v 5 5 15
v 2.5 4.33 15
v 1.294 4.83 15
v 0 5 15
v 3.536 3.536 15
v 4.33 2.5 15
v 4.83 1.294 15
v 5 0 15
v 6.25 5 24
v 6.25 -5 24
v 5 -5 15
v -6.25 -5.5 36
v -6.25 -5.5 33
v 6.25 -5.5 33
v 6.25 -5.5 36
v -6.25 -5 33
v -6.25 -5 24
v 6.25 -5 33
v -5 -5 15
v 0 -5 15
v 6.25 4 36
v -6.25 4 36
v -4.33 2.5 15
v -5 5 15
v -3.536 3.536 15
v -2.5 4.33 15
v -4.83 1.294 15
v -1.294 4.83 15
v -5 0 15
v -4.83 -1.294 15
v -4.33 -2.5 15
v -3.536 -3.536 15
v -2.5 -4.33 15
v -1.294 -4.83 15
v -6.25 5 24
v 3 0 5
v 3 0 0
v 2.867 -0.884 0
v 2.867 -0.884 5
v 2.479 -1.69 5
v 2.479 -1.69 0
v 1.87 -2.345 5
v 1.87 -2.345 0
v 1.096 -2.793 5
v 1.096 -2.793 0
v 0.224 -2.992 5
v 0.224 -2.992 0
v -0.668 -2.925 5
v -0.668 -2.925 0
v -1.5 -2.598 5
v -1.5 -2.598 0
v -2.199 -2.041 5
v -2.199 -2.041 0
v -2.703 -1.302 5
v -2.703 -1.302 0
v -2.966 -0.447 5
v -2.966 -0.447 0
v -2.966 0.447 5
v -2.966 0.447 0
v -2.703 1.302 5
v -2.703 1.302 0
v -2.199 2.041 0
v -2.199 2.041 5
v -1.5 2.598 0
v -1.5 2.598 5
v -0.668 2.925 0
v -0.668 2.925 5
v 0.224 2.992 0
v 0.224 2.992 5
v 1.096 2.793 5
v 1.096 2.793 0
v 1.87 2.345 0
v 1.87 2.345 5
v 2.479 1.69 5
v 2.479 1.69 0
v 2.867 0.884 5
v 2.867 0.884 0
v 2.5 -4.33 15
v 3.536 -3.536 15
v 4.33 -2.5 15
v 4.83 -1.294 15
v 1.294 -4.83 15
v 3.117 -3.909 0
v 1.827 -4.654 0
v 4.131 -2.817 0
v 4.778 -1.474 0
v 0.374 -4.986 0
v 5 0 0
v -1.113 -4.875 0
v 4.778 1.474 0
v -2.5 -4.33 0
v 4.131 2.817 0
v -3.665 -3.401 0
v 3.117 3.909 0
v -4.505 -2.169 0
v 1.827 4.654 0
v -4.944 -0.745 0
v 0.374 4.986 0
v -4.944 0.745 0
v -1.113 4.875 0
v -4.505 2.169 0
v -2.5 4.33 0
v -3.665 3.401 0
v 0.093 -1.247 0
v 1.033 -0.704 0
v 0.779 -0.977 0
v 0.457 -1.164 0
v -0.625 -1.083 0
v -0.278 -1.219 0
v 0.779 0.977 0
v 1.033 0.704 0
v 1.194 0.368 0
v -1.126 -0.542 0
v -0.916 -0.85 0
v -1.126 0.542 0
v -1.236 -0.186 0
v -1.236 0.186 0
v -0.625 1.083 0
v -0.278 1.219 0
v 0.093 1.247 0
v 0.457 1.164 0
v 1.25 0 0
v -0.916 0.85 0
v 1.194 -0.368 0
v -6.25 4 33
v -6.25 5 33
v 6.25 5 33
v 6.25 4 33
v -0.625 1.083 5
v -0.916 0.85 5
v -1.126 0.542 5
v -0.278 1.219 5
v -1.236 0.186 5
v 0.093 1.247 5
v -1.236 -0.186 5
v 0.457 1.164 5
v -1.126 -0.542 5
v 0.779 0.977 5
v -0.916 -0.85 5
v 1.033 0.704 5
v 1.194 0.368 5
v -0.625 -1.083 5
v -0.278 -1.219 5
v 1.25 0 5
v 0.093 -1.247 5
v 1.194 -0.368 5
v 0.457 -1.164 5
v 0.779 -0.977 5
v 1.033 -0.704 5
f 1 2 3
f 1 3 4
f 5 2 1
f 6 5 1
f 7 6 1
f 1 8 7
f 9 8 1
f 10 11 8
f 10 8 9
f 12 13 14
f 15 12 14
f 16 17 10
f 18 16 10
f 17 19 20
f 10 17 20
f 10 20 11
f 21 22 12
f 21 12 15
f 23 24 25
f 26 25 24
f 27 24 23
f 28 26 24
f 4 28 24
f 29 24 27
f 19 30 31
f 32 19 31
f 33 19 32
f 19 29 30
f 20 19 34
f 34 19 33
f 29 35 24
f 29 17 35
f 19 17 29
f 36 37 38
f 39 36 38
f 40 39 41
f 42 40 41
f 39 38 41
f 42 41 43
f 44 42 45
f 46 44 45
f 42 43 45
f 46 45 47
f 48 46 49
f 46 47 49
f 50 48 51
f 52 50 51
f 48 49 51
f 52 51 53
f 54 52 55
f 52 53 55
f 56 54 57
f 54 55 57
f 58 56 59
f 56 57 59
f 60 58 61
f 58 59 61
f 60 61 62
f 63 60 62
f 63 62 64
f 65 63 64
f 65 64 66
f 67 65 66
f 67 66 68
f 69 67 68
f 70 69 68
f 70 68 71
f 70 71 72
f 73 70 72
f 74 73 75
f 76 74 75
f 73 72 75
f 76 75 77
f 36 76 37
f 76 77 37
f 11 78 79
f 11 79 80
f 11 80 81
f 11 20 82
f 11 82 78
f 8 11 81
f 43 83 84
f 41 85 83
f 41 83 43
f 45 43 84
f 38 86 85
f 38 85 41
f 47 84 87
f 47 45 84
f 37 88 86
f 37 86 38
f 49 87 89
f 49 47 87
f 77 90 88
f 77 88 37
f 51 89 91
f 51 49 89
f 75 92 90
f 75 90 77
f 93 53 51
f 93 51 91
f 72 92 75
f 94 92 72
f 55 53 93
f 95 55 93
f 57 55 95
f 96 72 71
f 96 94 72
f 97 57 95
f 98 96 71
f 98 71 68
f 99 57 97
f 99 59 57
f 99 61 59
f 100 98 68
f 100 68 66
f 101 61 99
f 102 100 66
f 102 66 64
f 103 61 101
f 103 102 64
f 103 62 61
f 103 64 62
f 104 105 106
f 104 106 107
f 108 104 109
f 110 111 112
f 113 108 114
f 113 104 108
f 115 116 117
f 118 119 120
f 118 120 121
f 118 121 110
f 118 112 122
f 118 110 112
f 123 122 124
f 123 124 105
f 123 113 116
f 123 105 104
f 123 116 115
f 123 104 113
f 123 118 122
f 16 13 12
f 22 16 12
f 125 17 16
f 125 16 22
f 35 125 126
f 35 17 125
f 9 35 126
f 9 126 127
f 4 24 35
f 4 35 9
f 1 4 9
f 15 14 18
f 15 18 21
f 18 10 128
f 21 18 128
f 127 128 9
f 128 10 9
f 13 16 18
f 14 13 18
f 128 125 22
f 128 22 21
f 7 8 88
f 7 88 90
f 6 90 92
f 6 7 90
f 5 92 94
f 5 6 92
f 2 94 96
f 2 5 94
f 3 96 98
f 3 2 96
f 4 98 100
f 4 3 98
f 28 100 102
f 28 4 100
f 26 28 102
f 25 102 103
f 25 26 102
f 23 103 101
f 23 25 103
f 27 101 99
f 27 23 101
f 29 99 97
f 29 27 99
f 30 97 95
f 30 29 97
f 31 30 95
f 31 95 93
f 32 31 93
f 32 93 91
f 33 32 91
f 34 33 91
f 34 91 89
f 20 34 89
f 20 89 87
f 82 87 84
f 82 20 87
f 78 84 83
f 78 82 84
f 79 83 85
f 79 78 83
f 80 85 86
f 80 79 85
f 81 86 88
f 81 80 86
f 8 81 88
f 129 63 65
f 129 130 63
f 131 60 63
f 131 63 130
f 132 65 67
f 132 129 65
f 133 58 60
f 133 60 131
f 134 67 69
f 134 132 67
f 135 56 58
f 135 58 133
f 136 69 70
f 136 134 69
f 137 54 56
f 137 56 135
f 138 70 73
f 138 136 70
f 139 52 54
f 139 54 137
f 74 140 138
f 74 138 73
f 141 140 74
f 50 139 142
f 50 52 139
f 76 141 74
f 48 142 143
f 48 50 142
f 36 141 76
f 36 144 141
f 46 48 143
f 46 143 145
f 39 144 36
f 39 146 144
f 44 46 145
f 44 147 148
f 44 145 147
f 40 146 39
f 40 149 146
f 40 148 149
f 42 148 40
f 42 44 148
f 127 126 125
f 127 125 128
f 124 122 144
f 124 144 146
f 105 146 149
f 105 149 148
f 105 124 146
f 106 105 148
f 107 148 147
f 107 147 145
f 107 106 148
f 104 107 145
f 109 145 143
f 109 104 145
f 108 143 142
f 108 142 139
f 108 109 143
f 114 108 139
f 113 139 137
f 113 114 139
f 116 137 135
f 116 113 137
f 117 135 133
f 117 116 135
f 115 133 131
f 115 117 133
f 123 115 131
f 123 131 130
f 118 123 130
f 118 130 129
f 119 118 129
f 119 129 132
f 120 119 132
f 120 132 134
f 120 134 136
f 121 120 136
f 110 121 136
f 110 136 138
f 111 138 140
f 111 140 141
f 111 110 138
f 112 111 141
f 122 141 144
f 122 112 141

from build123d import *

# Parameters (mm, degrees)
F0_W     = 5
F0_H     = 15
F2_R     = 3
F2_R_2   = 1.25
F3_DEPTH = 5
F5_DEPTH = 5
F6_W     = 12.5
F6_H     = 10
F7_DEPTH = 9
F8_W     = 12.5
F8_H     = 9.5
F9_DEPTH = 3


with BuildPart() as f1:
    # F0 (on Front) → F1 (revolve)
    with BuildSketch(Plane.XZ):
        with Locations((2.5, 7.5)):
            Rectangle(F0_W, F0_H)
    revolve(axis=Axis((0, 0, 7.5), (0, 0, 1)))

    # F2 (on face) → F3 (cut)
    with BuildSketch(Plane(origin=(0, 0, 0), x_dir=(1, 0, 0), z_dir=(0, 0, -1))):
        Circle(F2_R)
        Circle(F2_R_2, mode=Mode.SUBTRACT)
    extrude(amount=-F3_DEPTH, mode=Mode.SUBTRACT)

    # F4 (on Front) → F5 (join, symmetric)
    with BuildSketch(Plane.XZ):
        Polygon((-6.25, 24), (-5, 15), (5, 15), (6.25, 24), align=None)
    extrude(amount=F5_DEPTH, both=True)

    # F6 (on face) → F7 (join)
    with BuildSketch(Plane.XY.offset(24)):
        Rectangle(F6_W, F6_H)
    extrude(amount=F7_DEPTH)

    # F8 (on face) → F9 (join)
    with BuildSketch(Plane.XY.offset(33)):
        with Locations((0, -0.75)):
            Rectangle(F8_W, F8_H)
    extrude(amount=F9_DEPTH)


solid = f1.part
